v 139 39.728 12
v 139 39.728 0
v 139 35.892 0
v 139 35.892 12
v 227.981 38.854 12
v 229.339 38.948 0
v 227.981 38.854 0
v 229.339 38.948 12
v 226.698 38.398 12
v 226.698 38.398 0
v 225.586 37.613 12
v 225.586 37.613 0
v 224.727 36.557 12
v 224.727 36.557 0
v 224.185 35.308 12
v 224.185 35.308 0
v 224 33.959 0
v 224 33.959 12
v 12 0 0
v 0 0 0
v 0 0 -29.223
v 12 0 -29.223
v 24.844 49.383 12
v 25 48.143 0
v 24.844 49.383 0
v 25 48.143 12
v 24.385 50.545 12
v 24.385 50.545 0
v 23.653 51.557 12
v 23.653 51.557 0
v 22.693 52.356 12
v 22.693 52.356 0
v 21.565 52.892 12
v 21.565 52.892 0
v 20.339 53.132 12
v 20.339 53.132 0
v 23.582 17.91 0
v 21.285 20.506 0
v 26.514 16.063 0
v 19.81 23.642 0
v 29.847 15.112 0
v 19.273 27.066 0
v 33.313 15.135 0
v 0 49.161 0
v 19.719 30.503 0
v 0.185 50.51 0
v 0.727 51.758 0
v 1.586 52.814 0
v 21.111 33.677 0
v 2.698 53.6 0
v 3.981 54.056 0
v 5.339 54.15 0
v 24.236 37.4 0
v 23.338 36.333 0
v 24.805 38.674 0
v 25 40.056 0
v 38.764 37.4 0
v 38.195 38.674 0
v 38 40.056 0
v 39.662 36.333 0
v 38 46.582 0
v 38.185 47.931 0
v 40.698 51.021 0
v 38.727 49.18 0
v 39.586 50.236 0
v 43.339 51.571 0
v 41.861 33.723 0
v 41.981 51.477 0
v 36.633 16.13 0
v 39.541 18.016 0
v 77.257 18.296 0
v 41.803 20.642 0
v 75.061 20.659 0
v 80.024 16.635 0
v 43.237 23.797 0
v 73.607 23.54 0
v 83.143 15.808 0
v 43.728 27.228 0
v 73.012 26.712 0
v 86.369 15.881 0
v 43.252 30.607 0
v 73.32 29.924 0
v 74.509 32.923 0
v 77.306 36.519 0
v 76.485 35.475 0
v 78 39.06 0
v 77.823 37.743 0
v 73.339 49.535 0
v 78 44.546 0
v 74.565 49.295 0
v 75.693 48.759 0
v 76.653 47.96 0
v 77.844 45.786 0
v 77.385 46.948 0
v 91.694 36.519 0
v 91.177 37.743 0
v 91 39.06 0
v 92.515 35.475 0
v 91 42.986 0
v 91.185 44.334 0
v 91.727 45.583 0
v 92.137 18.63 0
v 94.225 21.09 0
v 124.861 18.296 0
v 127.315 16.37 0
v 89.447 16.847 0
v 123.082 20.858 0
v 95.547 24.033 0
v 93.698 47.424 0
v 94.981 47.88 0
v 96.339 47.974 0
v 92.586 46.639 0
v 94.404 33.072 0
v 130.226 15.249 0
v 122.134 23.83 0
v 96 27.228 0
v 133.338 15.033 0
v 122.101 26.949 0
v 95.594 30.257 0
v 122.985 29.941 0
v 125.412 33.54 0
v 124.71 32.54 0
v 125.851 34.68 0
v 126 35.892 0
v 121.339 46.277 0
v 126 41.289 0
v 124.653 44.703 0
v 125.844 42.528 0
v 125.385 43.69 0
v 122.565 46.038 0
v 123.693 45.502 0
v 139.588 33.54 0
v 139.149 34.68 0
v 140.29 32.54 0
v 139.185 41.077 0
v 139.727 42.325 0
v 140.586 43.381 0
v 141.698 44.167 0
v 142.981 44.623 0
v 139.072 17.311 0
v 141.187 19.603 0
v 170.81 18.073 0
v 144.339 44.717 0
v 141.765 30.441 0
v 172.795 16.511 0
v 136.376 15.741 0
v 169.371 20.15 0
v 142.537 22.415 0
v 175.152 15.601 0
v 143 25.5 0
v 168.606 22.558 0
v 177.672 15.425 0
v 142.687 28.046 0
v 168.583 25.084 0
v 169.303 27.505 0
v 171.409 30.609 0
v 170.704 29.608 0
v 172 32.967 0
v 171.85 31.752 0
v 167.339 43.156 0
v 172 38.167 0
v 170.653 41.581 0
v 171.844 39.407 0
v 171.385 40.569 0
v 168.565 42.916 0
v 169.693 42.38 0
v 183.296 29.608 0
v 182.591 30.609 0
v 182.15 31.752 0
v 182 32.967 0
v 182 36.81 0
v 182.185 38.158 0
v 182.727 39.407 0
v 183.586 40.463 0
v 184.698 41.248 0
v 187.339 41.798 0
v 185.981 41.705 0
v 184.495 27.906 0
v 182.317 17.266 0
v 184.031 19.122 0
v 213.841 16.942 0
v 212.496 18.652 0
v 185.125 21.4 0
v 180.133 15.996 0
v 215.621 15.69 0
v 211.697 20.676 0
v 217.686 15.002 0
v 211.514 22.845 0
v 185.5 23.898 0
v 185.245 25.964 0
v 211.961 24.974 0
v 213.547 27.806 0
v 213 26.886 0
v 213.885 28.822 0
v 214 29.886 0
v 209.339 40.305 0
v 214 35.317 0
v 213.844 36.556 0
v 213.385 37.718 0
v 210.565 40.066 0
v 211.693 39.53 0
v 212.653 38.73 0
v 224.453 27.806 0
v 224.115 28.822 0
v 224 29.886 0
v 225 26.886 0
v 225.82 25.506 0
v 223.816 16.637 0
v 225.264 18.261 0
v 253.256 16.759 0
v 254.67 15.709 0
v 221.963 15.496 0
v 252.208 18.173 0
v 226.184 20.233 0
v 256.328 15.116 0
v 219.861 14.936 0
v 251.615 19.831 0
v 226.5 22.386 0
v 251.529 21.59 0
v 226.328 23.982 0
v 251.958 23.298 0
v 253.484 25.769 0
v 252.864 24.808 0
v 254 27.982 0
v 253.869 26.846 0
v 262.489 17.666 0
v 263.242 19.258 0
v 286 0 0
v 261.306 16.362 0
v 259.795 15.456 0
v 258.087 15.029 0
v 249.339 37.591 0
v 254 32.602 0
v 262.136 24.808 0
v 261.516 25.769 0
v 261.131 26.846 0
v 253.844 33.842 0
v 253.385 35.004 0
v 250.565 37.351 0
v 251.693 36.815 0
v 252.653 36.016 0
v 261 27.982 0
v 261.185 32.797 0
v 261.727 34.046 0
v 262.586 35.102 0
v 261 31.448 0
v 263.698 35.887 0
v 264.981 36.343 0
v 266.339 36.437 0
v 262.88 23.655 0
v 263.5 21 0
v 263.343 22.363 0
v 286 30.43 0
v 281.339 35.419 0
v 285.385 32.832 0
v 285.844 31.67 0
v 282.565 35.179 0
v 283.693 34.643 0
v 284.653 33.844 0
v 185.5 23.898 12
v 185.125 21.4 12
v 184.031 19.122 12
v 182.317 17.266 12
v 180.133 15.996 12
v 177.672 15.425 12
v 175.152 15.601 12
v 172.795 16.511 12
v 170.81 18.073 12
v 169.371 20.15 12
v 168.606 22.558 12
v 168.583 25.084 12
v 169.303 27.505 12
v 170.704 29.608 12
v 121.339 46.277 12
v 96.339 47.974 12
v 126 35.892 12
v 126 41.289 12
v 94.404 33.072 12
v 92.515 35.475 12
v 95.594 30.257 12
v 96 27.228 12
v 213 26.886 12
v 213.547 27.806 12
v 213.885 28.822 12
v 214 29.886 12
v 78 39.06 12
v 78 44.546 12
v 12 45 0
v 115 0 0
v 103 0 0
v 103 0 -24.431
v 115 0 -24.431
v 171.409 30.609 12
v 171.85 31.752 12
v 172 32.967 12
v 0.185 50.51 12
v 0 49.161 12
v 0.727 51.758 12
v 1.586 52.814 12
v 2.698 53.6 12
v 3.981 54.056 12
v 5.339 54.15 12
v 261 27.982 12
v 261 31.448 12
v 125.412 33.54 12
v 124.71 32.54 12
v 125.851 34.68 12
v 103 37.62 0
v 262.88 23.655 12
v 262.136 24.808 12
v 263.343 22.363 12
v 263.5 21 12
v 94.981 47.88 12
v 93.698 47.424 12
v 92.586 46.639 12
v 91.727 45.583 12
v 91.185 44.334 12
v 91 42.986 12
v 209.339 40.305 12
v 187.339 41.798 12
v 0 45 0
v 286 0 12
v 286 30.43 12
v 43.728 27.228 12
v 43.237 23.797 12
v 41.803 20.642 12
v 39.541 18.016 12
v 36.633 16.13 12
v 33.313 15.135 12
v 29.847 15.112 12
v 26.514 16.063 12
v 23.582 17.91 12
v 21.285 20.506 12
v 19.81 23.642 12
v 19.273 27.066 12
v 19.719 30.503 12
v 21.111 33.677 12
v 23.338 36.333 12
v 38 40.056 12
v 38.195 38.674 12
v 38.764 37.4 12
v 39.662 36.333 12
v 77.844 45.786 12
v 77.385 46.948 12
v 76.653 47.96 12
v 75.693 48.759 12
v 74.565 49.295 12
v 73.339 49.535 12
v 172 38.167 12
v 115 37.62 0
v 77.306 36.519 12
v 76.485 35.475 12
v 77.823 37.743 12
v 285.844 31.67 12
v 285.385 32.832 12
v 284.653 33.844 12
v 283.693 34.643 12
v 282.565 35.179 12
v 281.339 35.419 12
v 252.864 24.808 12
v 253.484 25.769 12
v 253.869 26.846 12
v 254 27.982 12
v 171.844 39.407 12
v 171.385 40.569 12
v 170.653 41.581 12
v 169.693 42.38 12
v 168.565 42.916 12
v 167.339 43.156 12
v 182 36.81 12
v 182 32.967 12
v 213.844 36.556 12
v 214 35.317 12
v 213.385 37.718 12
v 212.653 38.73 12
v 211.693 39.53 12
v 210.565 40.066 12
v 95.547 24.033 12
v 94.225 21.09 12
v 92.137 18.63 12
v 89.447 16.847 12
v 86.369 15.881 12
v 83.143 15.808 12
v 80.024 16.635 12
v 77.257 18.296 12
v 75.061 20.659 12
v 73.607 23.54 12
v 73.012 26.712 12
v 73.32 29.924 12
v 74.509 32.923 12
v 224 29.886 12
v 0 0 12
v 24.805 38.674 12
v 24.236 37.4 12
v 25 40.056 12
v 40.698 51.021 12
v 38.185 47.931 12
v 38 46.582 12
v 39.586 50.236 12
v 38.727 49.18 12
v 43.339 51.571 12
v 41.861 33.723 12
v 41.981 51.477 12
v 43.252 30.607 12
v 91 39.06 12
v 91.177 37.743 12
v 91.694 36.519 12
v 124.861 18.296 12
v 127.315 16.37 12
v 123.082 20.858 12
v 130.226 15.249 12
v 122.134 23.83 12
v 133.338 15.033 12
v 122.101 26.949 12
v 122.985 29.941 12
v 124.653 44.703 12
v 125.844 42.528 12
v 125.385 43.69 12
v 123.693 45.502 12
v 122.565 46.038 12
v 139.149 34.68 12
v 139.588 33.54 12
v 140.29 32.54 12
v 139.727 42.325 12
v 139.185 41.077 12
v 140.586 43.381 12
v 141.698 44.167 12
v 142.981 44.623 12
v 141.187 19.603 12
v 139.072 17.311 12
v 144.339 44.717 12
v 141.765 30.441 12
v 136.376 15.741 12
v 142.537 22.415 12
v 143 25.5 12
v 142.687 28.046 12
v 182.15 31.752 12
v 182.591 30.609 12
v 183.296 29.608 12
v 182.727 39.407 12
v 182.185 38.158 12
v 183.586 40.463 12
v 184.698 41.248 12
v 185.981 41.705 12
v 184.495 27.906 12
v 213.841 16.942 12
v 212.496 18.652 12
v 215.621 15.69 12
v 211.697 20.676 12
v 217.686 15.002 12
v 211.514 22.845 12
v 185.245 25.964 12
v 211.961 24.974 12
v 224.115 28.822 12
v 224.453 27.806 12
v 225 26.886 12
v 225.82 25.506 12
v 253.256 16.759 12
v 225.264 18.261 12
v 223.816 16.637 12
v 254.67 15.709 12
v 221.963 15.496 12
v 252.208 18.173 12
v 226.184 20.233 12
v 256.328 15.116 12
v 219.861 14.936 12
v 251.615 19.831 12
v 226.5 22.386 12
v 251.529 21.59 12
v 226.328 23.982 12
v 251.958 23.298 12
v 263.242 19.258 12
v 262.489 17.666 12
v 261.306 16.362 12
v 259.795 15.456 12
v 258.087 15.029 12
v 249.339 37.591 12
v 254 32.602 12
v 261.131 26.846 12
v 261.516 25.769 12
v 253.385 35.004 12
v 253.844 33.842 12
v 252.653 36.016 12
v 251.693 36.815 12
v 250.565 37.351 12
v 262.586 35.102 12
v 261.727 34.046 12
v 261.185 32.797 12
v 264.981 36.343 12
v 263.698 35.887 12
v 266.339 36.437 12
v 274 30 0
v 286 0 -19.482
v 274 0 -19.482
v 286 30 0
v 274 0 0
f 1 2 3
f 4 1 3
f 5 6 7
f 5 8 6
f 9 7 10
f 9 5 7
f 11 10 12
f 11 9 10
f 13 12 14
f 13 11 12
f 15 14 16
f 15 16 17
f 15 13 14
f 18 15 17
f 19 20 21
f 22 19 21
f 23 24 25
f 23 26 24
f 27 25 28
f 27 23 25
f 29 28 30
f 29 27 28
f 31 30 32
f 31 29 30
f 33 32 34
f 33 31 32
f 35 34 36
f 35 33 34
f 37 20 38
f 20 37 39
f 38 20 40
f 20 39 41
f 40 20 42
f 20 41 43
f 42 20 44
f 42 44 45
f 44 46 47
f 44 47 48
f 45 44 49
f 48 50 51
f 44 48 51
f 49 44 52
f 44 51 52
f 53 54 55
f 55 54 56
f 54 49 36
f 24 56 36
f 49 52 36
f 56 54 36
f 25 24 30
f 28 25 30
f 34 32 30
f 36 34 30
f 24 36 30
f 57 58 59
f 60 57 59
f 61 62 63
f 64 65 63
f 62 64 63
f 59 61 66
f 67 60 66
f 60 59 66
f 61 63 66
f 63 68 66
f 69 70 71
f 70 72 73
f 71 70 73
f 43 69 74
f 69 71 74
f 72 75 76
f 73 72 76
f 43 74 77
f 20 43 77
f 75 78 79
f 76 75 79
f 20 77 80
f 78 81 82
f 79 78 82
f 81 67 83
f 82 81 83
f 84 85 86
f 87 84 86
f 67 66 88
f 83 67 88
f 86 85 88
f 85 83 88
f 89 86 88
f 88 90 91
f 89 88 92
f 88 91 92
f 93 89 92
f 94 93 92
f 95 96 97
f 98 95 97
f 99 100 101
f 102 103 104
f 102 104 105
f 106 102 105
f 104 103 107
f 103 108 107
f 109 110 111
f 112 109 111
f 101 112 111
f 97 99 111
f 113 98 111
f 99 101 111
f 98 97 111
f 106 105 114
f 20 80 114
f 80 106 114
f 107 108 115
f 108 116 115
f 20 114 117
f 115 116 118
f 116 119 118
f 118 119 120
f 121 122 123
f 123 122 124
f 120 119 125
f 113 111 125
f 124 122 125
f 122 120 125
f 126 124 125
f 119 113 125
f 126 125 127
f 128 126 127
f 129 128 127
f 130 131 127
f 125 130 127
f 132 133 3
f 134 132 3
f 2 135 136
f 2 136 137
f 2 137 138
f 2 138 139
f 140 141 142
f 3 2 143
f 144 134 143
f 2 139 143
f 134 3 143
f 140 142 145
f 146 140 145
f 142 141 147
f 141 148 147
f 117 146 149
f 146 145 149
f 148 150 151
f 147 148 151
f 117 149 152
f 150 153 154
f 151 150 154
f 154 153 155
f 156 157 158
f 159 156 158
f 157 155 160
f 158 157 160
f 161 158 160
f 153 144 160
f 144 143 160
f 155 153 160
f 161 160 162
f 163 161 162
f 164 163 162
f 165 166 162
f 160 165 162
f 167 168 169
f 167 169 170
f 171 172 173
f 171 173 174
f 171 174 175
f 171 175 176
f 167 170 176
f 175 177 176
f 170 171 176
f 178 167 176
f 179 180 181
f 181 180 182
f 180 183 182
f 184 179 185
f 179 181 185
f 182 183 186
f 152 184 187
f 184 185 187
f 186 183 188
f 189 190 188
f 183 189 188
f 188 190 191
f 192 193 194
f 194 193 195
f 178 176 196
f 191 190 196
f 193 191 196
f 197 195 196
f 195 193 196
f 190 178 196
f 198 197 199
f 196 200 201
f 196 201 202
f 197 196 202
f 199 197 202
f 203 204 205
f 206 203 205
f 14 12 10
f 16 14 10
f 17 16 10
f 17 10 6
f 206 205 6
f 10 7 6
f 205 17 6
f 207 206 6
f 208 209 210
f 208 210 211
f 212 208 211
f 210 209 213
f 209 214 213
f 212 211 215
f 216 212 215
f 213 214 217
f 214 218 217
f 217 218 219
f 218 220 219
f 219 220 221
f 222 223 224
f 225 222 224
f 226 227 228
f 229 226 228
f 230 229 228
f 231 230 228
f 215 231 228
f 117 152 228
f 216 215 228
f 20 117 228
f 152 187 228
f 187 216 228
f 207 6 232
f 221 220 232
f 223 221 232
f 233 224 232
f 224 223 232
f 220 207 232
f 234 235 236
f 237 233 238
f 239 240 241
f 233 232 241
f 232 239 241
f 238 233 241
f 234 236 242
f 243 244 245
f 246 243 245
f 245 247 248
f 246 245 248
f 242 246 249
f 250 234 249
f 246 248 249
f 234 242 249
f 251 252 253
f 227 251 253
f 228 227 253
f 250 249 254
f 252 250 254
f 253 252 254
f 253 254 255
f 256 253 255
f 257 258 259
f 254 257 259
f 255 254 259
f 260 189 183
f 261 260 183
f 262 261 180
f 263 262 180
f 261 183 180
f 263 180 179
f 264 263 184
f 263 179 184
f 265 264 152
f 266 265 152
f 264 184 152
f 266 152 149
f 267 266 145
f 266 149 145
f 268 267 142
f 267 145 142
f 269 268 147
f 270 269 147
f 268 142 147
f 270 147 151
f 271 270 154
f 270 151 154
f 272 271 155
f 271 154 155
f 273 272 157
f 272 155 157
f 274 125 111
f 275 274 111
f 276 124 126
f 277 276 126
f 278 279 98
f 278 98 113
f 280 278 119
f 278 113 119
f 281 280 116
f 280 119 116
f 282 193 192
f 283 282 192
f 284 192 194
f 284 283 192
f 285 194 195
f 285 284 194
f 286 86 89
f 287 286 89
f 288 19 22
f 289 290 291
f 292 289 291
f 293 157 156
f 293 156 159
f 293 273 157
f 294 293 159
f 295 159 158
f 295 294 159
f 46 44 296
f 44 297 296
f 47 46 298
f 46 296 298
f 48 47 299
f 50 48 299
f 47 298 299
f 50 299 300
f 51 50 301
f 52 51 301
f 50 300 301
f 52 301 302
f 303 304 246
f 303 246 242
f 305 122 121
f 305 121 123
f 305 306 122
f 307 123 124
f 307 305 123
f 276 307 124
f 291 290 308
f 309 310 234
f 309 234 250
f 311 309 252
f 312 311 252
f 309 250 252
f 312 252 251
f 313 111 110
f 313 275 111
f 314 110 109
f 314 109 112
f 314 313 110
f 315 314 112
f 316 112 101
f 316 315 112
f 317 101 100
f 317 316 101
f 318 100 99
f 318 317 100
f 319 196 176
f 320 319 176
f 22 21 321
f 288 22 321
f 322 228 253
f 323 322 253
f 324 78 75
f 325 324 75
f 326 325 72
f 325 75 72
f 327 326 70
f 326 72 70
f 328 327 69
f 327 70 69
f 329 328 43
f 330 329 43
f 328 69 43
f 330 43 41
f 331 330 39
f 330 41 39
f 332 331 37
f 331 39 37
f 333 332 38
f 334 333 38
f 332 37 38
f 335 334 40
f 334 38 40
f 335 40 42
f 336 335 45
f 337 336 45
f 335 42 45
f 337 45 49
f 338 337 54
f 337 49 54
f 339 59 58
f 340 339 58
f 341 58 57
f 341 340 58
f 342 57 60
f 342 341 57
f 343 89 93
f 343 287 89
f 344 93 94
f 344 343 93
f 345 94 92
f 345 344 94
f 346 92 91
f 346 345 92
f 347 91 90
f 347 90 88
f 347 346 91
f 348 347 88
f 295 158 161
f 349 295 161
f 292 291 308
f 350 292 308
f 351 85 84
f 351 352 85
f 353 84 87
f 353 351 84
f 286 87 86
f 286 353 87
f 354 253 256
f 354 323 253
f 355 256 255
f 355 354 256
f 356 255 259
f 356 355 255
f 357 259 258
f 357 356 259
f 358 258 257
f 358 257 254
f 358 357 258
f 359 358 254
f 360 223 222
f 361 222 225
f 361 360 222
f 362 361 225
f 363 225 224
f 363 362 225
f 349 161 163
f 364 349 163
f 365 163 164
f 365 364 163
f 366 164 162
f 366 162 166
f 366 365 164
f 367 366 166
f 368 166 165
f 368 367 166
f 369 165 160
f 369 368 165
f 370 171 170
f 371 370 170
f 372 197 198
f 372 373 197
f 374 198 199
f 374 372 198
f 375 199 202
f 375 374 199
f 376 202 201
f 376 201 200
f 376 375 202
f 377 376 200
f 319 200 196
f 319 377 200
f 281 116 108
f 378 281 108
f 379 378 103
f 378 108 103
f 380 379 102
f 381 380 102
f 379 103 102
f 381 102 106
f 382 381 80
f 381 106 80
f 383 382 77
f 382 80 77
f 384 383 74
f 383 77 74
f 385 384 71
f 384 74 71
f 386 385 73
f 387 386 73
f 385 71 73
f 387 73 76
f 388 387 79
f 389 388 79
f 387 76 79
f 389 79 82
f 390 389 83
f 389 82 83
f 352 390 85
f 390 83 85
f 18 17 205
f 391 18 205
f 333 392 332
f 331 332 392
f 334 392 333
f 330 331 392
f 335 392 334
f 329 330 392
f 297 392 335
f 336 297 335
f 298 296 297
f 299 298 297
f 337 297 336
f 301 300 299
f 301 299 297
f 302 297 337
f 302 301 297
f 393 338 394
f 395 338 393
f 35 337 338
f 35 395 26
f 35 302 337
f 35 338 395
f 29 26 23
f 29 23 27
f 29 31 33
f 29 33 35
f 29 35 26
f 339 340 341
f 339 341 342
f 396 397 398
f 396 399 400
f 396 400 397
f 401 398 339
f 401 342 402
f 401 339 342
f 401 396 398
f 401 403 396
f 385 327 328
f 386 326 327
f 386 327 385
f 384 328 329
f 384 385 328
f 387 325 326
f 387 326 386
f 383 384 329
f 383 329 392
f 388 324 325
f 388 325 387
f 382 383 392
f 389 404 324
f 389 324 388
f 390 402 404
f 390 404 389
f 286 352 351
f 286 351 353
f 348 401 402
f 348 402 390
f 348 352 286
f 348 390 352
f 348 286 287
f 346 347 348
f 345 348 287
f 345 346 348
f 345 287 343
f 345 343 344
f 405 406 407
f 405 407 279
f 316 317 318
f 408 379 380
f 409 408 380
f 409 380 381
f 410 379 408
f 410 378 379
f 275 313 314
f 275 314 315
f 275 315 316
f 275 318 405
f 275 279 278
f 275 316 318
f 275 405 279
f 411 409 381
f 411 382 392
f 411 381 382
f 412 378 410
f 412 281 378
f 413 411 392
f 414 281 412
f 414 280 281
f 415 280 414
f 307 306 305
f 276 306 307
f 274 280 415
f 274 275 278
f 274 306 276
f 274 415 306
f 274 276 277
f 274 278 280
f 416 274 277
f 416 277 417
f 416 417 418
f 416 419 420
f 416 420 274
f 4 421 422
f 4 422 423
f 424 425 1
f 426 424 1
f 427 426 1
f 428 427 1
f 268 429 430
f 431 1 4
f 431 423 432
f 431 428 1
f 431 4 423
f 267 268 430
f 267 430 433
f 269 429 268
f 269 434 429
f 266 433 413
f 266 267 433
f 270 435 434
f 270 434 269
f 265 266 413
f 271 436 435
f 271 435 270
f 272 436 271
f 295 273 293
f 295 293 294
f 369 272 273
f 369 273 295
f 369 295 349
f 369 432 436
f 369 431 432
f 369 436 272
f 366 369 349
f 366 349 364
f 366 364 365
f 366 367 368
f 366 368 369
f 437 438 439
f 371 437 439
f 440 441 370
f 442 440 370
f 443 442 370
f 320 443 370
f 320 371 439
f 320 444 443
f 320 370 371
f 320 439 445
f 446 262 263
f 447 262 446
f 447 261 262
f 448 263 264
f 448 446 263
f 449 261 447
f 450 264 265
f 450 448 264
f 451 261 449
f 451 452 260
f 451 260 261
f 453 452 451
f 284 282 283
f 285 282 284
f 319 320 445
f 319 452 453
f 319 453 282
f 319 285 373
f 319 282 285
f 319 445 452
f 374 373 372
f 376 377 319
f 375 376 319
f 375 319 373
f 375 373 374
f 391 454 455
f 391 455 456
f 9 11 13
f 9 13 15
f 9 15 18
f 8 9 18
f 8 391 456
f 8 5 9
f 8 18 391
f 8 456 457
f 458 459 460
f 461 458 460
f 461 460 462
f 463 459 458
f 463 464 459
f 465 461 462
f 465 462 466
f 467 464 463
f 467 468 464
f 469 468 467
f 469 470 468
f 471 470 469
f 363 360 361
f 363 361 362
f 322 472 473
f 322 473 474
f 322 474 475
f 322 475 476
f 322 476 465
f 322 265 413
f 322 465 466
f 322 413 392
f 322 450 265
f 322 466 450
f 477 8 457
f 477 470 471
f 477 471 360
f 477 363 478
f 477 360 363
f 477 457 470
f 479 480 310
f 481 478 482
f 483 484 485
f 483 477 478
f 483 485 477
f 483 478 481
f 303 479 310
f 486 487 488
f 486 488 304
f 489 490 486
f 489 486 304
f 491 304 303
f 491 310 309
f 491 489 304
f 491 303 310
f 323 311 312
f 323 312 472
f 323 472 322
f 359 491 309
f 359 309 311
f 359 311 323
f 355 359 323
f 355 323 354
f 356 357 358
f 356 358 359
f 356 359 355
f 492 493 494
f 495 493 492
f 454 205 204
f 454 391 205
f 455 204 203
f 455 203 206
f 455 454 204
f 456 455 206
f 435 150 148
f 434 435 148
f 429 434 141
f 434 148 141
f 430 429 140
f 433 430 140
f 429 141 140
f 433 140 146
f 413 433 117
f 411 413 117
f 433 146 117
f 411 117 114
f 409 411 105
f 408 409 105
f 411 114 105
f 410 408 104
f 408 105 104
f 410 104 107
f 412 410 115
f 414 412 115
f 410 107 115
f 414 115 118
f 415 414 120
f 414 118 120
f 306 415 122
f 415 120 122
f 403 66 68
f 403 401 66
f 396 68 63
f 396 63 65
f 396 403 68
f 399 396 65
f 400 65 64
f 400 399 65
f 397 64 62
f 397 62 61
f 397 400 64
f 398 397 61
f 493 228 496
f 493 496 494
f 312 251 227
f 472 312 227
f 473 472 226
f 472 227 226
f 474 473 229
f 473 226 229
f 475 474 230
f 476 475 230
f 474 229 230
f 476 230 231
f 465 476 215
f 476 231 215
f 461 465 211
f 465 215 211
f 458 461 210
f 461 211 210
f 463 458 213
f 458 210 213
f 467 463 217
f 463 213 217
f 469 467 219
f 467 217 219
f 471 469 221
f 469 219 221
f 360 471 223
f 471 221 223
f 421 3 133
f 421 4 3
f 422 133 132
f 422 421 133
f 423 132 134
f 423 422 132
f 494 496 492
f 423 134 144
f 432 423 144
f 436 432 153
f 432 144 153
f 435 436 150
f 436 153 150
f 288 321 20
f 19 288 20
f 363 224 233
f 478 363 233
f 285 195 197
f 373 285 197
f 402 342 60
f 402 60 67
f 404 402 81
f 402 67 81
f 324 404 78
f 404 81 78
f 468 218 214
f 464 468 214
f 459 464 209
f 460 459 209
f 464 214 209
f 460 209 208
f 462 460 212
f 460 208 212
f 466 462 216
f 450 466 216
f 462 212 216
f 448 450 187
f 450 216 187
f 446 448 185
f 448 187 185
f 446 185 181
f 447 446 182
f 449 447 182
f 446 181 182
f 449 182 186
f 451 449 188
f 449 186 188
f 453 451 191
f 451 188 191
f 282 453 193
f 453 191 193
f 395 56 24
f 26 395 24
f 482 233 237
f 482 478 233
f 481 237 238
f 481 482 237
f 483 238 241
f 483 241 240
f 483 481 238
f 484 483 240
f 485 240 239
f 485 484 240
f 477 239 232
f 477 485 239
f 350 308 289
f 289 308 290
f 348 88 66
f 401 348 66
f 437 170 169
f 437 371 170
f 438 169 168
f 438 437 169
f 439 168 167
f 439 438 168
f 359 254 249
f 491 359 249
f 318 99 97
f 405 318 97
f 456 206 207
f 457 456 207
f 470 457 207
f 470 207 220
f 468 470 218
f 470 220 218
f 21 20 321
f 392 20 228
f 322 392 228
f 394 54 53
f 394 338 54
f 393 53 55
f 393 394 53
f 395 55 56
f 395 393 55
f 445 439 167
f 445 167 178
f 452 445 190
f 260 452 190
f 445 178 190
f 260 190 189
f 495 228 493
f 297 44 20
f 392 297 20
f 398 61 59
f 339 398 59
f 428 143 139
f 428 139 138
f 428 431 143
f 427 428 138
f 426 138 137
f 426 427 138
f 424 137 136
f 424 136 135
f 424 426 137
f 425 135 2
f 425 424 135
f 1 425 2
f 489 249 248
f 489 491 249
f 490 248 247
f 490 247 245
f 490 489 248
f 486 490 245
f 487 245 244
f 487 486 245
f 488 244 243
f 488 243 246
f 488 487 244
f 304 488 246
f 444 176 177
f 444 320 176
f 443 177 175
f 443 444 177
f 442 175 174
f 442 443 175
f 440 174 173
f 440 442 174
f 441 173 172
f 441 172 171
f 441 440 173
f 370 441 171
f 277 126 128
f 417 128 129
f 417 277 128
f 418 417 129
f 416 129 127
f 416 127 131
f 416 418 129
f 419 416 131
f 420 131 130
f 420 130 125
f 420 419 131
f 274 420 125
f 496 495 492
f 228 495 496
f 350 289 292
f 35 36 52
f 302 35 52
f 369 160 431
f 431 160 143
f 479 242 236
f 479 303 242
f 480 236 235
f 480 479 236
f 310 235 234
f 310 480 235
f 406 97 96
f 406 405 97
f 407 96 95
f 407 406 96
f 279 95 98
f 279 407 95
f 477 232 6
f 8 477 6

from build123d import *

# Parameters (mm, degrees)
F1_DEPTH = 12
F2_R     = 5
F4_DEPTH = 12
F6_DEPTH = 12
F9_DEPTH = 12


with BuildPart() as f1:
    # F0 (on Top) → F1 (new body)
    with BuildSketch(Plane.XY):
        with BuildLine():
            Line((0, 54.512049), (0, 0))
            Line((0, 0), (286, 0))
            Line((286, 0), (286, 35.102649))
            Line((286, 35.102649), (261, 36.799275))
            Line((261, 36.799275), (261, 25.873397))
            ThreePointArc((261, 25.873397), (262.838539, 23.738613), (263.5, 21))
            ThreePointArc((263.5, 21), (254.761387, 15.661461), (254, 25.873397))
            Line((254, 25.873397), (254, 37.274331))
            Line((254, 37.274331), (224, 39.310282))
            Line((224, 39.310282), (224, 27.97617))
            ThreePointArc((224, 27.97617), (225.846532, 25.447862), (226.5, 22.386))
            ThreePointArc((226.5, 22.386), (215.938138, 15.539468), (214, 27.97617))
            Line((214, 27.97617), (214, 39.988932))
            Line((214, 39.988932), (182, 42.160613))
            Line((182, 42.160613), (182, 30.771864))
            ThreePointArc((182, 30.771864), (184.574629, 27.754812), (185.5, 23.898))
            ThreePointArc((185.5, 23.898), (173.143188, 16.323371), (172, 30.771864))
            Line((172, 30.771864), (172, 42.839263))
            Line((172, 42.839263), (139, 45.07881))
            Line((139, 45.07881), (139, 33.746211))
            ThreePointArc((139, 33.746211), (141.947222, 30.082576), (143, 25.5))
            ThreePointArc((143, 25.5), (127.917424, 16.052778), (126, 33.746211))
            Line((126, 33.746211), (126, 45.961055))
            Line((126, 45.961055), (91, 48.336331))
            Line((91, 48.336331), (91, 36.714833))
            ThreePointArc((91, 36.714833), (94.673495, 32.589903), (96, 27.228))
            ThreePointArc((96, 27.228), (79.138097, 17.054505), (78, 36.714833))
            Line((78, 36.714833), (78, 49.218577))
            Line((78, 49.218577), (38, 51.933178))
            Line((38, 51.933178), (38, 37.585315))
            ThreePointArc((38, 37.585315), (42.200607, 33.145854), (43.728, 27.228))
            ThreePointArc((43.728, 27.228), (25.582146, 16.527393), (25, 37.585315))
            Line((25, 37.585315), (25, 52.815424))
            Line((25, 52.815424), (0, 54.512049))
        make_face()
    extrude(amount=F1_DEPTH)

    # F2
    f2_edges = [f1.edges().sort_by_distance(p)[0] for p in [
        (286, 35.102649, 6),
        (261, 36.799275, 6),
        (254, 37.274331, 6),
        (224, 39.310282, 6),
        (214, 39.988932, 6),
        (182, 42.160613, 6),
        (172, 42.839263, 6),
        (139, 45.07881, 6),
        (126, 45.961055, 6),
        (91, 48.336331, 6),
        (78, 49.218577, 6),
        (38, 51.933178, 6),
        (25, 52.815424, 6),
        (0, 54.512049, 6),
        (25, 37.585315, 6),
        (38, 37.585315, 6),
        (91, 36.714833, 6),
        (139, 33.746211, 6),
        (182, 30.771864, 6),
        (78, 36.714833, 6),
        (126, 33.746211, 6),
        (214, 27.97617, 6),
        (254, 25.873397, 6),
        (261, 25.873397, 6),
        (224, 27.97617, 6),
        (172, 30.771864, 6),
    ]]
    fillet(f2_edges, radius=F2_R)


with BuildPart() as f4:
    # F3 (on Right) → F4 (new body)
    with BuildSketch(Plane.YZ):
        Polygon((45, 0), (0, 0), (0, -29.223342), align=None)
    extrude(amount=F4_DEPTH)


with BuildPart() as f6:
    # F5 (on face) → F6 (new body)
    with BuildSketch(Plane.YZ.offset(286)):
        Polygon((30, 0), (0, 0), (0, -19.482228), align=None)
    extrude(amount=-F6_DEPTH)


with BuildPart() as f9:
    # F8 (on offset) → F9 (new body)
    with BuildSketch(Plane.YZ.offset(103)):
        Polygon((0, -24.430629), (37.61987, 0), (0, 0), align=None)
    extrude(amount=F9_DEPTH)


solid = Compound([f1.part, f4.part, f6.part, f9.part])
